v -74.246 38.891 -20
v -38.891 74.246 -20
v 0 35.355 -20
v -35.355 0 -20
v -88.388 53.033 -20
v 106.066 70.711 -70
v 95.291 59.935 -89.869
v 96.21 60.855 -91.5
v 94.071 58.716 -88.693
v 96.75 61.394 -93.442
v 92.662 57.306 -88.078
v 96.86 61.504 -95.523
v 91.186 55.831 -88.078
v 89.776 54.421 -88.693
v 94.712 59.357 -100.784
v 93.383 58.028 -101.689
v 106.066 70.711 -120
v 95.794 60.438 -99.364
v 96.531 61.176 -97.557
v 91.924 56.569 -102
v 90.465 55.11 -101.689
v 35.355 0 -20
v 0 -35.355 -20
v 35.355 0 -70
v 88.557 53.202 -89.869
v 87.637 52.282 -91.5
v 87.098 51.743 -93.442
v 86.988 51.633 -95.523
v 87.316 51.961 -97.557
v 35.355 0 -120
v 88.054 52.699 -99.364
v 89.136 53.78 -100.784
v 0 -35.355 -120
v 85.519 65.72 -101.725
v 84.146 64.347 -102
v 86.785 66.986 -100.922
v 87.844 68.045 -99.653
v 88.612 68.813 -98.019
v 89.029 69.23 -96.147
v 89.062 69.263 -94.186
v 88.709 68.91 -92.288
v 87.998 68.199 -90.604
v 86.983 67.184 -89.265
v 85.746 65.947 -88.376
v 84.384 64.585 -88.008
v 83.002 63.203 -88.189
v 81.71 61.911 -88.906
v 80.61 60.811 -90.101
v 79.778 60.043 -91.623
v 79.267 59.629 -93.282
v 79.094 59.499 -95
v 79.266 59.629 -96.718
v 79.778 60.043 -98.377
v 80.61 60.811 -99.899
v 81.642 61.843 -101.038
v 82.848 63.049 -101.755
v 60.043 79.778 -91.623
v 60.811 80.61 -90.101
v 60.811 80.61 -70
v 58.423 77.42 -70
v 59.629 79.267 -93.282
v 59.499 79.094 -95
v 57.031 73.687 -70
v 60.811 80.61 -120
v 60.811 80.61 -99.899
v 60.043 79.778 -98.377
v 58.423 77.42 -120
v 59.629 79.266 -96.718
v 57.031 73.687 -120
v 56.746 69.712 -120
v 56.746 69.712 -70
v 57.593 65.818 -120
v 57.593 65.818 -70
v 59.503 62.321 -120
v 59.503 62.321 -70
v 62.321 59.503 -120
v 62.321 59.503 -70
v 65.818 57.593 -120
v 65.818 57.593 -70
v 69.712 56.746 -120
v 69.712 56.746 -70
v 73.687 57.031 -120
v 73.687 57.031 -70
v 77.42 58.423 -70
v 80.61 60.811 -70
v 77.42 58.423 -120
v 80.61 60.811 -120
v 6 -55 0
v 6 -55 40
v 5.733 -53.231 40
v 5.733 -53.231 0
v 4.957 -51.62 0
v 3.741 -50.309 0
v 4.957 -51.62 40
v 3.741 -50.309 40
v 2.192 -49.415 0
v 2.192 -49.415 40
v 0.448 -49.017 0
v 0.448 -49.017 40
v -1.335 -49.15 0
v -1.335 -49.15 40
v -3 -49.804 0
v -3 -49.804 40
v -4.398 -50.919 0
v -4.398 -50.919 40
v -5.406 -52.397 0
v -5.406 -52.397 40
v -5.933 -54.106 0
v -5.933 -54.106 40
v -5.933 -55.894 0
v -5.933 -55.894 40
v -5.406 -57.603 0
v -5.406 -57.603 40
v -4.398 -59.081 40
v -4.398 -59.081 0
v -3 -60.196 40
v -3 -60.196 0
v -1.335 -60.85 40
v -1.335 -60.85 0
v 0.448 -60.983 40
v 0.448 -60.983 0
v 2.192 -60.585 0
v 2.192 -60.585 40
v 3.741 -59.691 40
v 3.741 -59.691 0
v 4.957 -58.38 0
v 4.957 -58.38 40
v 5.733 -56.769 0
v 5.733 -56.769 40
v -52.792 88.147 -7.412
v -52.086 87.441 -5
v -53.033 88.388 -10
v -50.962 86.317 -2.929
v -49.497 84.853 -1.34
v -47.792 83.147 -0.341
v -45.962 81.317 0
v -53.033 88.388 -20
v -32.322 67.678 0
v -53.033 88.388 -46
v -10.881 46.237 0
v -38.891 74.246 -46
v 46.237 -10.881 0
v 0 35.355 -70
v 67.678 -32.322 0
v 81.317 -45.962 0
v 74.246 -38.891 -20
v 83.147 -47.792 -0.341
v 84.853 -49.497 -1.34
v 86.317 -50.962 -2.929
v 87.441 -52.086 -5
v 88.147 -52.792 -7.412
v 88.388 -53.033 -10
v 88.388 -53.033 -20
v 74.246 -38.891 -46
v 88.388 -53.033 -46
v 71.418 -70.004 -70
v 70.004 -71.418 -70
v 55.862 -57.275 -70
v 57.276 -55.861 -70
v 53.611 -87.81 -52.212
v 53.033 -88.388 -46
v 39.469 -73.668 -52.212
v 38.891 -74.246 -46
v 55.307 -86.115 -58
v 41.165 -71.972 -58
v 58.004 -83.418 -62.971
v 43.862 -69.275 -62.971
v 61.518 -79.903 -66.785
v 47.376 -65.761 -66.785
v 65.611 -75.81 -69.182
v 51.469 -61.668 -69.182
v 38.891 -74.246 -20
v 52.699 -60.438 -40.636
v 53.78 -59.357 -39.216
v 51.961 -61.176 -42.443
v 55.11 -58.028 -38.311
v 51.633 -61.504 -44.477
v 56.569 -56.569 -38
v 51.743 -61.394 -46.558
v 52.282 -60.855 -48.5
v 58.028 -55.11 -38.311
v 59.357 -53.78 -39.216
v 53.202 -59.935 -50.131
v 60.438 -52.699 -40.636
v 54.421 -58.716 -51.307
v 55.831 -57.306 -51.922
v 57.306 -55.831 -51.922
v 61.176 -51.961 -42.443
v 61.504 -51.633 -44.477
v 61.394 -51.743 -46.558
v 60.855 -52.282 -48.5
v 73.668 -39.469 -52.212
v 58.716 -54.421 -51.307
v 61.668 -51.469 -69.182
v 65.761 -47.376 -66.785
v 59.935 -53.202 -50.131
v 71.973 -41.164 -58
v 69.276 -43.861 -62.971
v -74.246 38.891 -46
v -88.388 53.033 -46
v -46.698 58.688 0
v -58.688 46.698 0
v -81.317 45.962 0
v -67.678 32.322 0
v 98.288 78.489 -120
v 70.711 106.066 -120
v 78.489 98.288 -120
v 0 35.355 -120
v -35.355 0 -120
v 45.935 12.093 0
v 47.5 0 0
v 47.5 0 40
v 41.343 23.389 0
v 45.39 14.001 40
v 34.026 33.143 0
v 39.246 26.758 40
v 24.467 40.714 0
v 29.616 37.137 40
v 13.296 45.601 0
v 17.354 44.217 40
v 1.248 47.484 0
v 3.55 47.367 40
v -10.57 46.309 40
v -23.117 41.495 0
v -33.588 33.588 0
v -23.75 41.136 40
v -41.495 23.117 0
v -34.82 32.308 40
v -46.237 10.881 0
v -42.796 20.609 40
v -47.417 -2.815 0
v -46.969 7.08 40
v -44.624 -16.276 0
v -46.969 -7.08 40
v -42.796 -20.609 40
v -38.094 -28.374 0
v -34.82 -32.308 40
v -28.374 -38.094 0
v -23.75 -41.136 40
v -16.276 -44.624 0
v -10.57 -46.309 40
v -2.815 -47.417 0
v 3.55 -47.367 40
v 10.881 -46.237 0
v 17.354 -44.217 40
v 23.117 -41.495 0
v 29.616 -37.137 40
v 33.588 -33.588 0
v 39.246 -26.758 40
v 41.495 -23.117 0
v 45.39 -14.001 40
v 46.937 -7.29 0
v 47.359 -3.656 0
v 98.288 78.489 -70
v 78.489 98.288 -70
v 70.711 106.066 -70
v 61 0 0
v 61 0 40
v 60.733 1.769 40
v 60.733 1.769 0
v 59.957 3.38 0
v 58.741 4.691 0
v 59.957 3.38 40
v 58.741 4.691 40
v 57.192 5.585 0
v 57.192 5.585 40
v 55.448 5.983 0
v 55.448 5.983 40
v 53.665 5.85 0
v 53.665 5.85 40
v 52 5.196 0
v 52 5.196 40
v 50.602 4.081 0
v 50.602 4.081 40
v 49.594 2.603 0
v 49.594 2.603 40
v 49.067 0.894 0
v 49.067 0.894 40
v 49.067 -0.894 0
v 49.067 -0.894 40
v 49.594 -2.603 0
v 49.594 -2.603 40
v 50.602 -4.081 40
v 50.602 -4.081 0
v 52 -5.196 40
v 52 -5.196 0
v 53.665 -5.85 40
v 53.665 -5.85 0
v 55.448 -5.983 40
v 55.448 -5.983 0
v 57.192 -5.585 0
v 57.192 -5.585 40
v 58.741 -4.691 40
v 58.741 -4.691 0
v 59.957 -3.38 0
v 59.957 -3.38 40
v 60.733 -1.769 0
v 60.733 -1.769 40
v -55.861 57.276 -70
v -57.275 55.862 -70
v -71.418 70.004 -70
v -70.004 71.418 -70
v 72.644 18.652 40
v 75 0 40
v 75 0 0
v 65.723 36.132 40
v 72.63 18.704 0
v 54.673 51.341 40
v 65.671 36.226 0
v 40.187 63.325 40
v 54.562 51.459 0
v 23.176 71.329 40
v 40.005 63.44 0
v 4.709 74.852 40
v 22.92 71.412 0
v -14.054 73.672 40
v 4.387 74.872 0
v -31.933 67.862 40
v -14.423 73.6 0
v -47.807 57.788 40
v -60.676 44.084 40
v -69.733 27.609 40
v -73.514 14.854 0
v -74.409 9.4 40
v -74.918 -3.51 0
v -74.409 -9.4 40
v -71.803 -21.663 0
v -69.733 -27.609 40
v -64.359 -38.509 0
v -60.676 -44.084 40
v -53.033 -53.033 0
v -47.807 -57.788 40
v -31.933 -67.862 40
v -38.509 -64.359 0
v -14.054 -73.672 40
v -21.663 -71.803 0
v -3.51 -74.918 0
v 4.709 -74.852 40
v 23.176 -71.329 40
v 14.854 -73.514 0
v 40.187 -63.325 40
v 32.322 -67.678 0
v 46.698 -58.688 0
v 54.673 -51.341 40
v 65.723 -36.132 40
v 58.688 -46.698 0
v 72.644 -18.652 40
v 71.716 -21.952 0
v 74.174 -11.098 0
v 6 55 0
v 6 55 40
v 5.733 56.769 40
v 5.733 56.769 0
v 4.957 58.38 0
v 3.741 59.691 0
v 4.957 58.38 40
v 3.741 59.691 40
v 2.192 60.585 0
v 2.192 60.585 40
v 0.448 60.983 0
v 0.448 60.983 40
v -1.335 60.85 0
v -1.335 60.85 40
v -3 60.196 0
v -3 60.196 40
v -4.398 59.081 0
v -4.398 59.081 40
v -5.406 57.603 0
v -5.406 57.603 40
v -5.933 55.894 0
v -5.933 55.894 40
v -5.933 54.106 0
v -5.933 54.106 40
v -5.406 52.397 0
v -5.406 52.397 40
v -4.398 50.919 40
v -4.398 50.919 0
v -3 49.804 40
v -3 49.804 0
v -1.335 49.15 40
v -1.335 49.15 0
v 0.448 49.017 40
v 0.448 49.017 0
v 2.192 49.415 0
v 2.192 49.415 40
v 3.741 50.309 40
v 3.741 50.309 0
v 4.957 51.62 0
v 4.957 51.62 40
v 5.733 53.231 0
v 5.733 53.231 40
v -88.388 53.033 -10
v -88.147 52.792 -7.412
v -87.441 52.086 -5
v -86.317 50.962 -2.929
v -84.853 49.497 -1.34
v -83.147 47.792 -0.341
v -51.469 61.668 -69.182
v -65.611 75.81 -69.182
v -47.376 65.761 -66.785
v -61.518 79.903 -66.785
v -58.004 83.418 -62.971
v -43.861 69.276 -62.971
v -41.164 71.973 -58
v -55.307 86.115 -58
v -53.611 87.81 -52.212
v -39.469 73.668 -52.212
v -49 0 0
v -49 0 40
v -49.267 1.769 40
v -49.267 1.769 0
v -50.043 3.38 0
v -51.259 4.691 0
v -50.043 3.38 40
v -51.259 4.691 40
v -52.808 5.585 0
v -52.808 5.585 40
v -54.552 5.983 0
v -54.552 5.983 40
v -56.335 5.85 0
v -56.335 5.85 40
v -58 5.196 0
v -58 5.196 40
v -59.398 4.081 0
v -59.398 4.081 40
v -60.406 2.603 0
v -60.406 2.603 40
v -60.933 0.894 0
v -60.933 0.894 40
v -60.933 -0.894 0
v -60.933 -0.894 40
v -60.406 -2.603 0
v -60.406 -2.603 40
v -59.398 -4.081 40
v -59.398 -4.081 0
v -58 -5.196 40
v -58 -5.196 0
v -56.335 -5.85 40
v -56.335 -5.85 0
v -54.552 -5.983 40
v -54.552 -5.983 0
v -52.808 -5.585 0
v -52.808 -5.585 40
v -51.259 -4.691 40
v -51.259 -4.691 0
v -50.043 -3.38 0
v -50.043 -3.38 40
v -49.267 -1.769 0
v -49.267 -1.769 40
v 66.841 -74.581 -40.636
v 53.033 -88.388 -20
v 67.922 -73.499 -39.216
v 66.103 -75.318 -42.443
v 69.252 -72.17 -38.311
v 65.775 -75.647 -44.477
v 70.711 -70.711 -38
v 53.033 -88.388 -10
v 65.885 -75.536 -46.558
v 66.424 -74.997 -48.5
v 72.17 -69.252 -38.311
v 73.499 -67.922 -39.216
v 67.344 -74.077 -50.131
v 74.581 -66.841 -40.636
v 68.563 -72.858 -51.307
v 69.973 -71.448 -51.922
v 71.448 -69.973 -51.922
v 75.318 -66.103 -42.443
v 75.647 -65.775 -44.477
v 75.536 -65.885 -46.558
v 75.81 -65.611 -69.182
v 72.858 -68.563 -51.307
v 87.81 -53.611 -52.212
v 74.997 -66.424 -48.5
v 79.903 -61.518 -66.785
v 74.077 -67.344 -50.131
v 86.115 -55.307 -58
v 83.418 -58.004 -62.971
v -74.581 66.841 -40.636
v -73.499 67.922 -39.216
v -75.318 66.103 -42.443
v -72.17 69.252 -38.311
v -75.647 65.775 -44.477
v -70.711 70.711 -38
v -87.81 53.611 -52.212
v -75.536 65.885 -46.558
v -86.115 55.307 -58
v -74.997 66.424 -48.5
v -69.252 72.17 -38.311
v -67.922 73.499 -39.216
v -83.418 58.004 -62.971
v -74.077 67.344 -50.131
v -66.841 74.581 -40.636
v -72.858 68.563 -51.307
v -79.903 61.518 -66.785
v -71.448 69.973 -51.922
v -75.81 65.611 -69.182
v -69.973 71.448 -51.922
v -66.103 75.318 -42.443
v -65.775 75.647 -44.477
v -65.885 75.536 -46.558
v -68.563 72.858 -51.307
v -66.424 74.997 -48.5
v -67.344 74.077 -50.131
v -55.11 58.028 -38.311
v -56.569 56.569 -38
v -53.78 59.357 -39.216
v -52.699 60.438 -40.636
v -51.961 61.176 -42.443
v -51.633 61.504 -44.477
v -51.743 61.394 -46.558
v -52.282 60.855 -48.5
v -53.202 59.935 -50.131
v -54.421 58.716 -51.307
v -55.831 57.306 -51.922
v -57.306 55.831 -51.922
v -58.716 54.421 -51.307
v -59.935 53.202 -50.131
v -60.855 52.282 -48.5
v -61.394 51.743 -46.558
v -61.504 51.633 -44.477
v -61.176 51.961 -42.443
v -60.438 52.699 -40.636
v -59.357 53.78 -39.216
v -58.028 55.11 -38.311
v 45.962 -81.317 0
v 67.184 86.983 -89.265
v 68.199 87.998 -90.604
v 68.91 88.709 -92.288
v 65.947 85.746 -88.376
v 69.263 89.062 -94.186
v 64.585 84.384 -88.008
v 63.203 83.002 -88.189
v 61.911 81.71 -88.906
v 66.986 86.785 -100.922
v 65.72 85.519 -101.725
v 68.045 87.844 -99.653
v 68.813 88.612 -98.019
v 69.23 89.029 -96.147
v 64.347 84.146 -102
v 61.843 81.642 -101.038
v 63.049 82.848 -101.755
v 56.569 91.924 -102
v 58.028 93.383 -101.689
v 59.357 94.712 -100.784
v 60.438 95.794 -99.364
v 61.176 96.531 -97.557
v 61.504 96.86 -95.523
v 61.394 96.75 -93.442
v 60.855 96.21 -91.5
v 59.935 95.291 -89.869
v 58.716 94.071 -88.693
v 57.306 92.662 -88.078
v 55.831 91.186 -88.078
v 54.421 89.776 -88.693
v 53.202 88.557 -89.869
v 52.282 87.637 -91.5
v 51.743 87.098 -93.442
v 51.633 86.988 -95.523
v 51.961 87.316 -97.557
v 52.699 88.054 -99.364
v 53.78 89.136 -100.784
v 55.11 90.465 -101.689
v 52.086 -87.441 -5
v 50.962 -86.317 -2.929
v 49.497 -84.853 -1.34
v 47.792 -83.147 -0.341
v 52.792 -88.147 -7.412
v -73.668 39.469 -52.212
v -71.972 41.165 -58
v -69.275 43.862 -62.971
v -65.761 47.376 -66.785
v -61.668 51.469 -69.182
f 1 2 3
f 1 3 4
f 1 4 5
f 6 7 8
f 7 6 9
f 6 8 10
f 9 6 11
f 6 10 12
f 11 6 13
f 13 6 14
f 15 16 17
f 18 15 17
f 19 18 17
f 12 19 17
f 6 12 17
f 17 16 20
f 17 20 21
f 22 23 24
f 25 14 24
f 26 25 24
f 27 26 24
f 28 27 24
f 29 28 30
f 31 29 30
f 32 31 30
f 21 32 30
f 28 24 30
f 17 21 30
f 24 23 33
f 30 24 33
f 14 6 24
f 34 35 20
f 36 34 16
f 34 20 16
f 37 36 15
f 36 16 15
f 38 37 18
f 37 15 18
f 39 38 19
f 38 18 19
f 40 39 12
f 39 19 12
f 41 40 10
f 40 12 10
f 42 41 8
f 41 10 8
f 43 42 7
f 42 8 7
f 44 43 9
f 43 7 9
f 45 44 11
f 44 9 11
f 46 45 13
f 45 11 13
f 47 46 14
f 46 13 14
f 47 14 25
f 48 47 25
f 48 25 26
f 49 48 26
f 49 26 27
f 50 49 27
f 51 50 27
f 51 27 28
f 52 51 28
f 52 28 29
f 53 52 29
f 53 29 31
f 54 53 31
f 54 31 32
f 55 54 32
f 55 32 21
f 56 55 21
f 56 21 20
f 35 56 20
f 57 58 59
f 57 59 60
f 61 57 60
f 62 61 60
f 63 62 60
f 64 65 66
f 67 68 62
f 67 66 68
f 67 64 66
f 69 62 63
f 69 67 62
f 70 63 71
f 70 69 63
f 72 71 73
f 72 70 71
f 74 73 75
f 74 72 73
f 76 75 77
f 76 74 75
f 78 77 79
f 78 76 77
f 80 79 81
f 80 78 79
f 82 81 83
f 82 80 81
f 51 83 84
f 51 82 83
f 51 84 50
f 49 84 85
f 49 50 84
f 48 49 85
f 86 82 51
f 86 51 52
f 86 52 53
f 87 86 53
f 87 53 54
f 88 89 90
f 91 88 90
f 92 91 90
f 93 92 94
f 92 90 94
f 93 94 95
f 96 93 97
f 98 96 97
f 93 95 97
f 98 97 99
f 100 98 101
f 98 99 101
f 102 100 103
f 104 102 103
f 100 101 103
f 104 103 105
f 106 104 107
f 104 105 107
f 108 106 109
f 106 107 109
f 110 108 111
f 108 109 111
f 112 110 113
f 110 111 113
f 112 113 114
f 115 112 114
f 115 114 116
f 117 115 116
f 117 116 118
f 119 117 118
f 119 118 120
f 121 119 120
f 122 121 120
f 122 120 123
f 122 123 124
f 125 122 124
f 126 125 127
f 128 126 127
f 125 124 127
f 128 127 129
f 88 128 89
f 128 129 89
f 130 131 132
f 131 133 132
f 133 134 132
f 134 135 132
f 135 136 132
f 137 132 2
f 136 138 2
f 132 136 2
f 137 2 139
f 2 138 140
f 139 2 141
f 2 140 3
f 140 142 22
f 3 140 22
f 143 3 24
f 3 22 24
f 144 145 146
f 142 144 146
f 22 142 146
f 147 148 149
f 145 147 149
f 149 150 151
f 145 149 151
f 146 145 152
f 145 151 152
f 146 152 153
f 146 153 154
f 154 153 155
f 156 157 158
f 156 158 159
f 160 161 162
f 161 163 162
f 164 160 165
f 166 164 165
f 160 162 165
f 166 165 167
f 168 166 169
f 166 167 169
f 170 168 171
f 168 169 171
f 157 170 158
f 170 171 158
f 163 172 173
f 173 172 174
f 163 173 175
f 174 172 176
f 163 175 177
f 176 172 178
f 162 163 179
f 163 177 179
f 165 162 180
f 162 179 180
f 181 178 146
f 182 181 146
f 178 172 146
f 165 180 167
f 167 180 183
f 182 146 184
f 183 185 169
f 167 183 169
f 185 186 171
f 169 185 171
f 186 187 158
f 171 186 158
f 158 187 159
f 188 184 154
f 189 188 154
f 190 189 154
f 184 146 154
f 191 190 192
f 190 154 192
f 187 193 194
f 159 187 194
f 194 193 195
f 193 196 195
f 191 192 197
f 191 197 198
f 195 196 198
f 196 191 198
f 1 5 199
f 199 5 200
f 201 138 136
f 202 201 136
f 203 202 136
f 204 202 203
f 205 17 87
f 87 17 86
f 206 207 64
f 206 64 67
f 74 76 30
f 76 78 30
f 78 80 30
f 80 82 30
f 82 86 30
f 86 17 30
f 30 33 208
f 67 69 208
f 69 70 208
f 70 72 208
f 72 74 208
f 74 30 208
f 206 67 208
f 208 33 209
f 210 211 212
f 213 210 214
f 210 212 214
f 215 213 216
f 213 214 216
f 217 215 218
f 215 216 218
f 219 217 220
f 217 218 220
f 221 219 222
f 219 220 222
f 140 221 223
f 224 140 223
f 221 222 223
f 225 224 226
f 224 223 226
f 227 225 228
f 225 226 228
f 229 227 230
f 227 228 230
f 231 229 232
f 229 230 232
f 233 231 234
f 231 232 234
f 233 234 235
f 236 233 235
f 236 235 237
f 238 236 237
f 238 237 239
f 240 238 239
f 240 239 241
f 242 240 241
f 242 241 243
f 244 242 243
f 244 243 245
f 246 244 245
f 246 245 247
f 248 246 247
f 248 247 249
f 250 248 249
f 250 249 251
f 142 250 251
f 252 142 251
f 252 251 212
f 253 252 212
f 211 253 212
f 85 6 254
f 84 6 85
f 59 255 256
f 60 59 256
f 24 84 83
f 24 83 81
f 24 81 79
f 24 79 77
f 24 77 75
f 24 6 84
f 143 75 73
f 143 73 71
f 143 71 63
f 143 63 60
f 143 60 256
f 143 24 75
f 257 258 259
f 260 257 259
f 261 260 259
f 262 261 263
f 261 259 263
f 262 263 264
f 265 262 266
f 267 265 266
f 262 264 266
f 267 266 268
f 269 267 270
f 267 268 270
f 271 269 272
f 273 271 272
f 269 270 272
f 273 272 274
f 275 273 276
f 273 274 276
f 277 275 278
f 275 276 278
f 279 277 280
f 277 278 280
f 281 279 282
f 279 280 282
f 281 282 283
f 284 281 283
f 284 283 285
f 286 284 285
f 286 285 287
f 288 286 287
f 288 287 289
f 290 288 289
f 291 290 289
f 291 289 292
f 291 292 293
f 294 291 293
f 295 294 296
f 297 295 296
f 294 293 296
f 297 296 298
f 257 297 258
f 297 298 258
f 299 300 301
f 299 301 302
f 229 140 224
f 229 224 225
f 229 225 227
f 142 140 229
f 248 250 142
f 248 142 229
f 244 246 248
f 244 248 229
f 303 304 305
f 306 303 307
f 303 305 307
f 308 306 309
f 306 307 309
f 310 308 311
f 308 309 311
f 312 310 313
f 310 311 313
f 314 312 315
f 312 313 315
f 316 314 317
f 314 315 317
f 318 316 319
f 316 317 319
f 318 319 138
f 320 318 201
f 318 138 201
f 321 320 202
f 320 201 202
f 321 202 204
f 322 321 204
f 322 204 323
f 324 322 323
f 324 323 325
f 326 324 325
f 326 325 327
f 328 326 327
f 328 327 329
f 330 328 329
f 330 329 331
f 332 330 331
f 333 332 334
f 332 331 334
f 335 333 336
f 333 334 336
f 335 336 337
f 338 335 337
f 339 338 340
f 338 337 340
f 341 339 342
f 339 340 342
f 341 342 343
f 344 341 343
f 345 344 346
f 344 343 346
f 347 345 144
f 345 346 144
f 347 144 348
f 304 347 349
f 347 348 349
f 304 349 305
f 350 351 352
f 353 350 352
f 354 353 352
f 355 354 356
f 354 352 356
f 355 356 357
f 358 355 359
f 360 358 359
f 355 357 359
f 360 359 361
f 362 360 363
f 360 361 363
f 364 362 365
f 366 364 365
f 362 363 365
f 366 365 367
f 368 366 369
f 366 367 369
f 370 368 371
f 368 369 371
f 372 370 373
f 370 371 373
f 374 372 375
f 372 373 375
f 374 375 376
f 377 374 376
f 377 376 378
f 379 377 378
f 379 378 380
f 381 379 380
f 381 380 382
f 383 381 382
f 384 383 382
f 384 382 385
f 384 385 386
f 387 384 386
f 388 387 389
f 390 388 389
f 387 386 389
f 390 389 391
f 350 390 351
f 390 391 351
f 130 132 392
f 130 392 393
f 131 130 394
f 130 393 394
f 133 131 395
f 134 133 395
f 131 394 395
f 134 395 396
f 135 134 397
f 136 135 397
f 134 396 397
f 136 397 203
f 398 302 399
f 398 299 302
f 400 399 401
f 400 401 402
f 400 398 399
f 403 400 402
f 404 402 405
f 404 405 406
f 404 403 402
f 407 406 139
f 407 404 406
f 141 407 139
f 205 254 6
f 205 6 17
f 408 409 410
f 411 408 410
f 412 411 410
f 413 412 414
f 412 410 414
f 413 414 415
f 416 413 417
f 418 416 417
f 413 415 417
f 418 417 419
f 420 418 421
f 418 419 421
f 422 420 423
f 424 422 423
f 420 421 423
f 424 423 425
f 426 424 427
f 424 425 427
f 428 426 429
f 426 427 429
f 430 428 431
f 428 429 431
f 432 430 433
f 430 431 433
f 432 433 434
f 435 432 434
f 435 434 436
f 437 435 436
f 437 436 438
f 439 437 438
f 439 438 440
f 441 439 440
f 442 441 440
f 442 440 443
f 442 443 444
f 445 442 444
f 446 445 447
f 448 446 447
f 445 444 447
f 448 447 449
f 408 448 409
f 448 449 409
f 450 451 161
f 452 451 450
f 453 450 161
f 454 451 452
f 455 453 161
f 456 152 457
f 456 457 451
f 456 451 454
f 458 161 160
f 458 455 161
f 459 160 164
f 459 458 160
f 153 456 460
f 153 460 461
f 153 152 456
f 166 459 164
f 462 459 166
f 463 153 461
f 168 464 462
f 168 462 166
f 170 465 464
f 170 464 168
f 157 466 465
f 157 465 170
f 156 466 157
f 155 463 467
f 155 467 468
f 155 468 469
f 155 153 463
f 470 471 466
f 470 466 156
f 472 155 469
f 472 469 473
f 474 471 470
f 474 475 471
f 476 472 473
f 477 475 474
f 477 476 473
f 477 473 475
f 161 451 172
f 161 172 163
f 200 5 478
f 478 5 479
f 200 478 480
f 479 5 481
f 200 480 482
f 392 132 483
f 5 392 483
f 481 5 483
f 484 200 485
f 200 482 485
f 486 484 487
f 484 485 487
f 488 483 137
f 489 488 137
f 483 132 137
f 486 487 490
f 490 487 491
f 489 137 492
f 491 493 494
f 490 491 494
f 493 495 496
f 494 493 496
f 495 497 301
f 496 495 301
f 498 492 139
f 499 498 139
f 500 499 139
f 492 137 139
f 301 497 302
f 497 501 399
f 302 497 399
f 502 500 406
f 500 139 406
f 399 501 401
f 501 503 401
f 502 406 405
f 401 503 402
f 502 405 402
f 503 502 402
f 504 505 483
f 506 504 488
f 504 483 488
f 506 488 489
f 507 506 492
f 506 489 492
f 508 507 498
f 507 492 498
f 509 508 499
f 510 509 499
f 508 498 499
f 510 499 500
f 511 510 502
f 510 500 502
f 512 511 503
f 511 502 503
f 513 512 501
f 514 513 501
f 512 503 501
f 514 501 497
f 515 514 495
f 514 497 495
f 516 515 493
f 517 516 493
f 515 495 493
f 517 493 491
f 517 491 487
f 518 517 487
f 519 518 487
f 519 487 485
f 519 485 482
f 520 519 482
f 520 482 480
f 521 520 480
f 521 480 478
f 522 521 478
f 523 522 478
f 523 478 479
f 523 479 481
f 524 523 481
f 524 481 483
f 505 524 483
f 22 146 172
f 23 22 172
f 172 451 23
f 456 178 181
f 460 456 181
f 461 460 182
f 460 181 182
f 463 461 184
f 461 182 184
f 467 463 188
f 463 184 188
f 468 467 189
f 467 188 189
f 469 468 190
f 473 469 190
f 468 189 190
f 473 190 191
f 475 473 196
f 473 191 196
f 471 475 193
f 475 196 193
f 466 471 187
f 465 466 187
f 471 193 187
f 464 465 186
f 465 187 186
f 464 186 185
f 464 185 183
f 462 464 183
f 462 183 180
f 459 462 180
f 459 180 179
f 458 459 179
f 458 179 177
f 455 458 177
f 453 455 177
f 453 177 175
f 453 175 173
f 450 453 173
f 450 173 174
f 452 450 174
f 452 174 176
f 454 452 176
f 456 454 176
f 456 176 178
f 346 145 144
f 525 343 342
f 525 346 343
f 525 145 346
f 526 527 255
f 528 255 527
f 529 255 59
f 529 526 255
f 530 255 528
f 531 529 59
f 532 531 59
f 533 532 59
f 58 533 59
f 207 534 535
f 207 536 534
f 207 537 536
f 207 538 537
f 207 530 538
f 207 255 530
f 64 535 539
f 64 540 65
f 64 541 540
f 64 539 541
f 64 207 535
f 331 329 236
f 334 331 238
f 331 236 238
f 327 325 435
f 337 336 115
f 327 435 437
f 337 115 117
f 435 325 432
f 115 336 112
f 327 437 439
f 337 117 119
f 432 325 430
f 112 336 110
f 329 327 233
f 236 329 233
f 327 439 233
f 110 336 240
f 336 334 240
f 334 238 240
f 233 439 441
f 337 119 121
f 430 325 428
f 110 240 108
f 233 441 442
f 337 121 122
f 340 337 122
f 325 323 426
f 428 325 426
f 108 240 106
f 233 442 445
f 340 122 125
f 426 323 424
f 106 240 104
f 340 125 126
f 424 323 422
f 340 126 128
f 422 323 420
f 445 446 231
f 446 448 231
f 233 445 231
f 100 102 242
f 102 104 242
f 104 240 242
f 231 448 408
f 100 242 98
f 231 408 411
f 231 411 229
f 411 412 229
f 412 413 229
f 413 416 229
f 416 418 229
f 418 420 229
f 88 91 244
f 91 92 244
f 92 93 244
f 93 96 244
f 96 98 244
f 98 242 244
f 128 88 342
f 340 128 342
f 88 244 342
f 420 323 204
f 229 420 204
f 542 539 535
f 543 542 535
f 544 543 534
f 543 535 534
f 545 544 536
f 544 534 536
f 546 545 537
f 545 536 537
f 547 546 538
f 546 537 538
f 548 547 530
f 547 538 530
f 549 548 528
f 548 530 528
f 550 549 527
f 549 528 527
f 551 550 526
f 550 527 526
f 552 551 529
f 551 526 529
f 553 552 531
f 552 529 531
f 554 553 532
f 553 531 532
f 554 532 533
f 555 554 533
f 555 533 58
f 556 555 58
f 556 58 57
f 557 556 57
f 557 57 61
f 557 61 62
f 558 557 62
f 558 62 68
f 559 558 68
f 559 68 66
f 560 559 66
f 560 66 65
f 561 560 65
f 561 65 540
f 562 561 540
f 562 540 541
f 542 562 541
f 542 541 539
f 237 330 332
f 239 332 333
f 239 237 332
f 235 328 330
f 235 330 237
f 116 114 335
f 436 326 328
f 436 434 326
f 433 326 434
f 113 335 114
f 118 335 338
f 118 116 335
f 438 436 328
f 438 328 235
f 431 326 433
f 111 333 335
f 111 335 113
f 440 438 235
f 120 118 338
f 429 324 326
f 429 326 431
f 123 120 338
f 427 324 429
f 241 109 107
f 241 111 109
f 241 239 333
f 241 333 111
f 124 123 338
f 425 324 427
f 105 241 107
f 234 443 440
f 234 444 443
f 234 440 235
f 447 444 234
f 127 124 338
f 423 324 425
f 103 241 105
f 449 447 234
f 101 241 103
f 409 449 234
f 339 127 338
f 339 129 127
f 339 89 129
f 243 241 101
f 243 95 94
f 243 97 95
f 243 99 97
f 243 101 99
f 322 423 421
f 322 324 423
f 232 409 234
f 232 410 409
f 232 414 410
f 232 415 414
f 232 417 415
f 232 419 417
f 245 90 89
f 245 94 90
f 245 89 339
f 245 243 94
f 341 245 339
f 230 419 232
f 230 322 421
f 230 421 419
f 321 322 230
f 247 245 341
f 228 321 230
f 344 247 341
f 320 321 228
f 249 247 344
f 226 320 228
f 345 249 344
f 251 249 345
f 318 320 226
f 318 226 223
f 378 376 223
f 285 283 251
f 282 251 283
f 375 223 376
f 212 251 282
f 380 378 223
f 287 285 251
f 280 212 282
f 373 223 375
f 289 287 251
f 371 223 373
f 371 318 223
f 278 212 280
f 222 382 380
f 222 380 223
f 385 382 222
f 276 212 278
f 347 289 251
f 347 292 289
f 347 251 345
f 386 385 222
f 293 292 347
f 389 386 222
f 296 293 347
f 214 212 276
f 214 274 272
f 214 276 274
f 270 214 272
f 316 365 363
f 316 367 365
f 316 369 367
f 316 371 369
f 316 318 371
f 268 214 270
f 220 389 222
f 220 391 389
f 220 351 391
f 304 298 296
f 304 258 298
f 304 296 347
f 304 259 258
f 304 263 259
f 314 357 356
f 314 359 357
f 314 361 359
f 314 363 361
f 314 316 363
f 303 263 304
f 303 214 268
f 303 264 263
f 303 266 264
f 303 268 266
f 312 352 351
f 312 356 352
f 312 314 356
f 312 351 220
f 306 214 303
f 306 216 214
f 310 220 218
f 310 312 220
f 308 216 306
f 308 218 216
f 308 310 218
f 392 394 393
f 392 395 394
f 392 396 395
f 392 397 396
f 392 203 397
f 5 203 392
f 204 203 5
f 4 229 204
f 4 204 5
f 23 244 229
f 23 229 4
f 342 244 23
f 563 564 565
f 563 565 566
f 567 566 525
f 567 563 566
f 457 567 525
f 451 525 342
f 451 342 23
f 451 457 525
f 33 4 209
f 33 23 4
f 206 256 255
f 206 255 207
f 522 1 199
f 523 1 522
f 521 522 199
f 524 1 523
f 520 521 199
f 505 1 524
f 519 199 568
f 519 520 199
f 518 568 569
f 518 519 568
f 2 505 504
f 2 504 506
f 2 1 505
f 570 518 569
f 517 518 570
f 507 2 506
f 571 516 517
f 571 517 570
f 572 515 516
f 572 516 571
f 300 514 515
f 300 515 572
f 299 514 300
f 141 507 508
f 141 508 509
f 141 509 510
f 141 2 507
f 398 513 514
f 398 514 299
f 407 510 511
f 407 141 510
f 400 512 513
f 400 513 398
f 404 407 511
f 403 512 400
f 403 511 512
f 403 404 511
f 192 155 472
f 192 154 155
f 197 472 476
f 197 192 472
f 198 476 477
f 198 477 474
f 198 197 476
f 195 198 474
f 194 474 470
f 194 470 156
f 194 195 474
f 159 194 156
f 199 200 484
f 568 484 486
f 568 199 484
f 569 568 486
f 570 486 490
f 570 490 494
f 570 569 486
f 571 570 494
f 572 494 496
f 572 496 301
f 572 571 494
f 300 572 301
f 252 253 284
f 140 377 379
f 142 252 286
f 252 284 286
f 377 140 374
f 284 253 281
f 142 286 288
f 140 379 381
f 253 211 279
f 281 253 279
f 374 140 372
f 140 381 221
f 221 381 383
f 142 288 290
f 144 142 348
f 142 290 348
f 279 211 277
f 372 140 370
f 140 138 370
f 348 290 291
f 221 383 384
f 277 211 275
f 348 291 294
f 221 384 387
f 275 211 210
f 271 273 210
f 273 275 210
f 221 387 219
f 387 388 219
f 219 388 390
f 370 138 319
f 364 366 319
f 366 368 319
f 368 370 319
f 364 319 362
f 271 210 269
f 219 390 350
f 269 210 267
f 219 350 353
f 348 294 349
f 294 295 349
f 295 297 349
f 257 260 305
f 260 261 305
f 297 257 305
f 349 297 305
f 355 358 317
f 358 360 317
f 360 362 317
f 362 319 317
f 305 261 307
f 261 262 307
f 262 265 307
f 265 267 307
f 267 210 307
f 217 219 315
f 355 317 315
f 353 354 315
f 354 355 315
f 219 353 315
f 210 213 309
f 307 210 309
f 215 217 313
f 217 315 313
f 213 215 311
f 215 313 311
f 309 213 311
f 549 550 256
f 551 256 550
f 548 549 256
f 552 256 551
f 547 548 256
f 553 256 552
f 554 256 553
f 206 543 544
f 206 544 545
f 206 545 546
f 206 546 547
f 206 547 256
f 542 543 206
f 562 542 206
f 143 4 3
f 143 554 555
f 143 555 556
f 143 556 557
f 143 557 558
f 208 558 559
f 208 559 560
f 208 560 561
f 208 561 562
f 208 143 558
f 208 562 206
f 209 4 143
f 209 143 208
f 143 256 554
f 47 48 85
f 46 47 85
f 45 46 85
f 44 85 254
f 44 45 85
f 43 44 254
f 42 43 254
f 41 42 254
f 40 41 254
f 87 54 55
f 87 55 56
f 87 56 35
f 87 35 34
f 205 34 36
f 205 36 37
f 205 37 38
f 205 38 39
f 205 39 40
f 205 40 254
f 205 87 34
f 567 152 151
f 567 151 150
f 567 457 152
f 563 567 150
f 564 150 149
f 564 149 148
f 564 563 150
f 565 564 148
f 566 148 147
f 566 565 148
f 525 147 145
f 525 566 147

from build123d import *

# Parameters (mm, degrees)
SZKIC1_R                    = 75
DODANIE_WYCI_GNI_CIE1_DEPTH = 40
SZKIC2_R                    = 6
WYTNIJ_WYCI_GNI_CIE1_DEPTH  = 40
SZKIC3_R                    = 47.5
WYTNIJ_WYCI_GNI_CIE2_DEPTH  = 40
SZKIC4_W                    = 50
SZKIC4_H                    = 20
DODANIE_WYCI_GNI_CIE2_DEPTH = 100
SZKIC6_W                    = 50
SZKIC6_H                    = 49.999779654
DODANIE_WYCI_GNI_CIE3_DEPTH = 20
SZKIC7_R                    = 7
WYTNIJ_WYCI_GNI_CIE3_DEPTH  = 226
ZAOKR_GLENIE1_R             = 24
ZAOKR_GLENIE2_R             = 10
DODANIE_WYCI_GNI_CIE4_DEPTH = 100
SZKIC10_W                   = 50
SZKIC10_H                   = 50
DODANIE_WYCI_GNI_CIE5_DEPTH = 100
SZKIC12_R                   = 7
WYTNIJ_WYCI_GNI_CIE5_DEPTH  = 163.5
WYTNIJ_WYCI_GNI_CIE6_DEPTH  = 161


with BuildPart() as part:
    # Szkic1 → Dodanie-wyciągnięcie1 (new body)
    with BuildSketch(Plane.XY):
        Circle(SZKIC1_R)
    extrude(amount=DODANIE_WYCI_GNI_CIE1_DEPTH)

    # Szkic2 → Wytnij-wyciągnięcie1 (cut)
    with BuildSketch(Plane.XY.offset(40)):
        with Locations((-55, 0)):
            Circle(SZKIC2_R)
        with Locations((0, 55)):
            Circle(SZKIC2_R)
        with Locations((55, 0)):
            Circle(SZKIC2_R)
        with Locations((0, -55)):
            Circle(SZKIC2_R)
    extrude(amount=-WYTNIJ_WYCI_GNI_CIE1_DEPTH, mode=Mode.SUBTRACT)

    # Szkic3 → Wytnij-wyciągnięcie2 (cut)
    with BuildSketch(Plane.XY.offset(40)):
        Circle(SZKIC3_R)
    extrude(amount=-WYTNIJ_WYCI_GNI_CIE2_DEPTH, mode=Mode.SUBTRACT)

    # Szkic4 → Dodanie-wyciągnięcie2 (add, symmetric)
    with BuildSketch(Plane(origin=(0, 0, 0), x_dir=(-0.707106781, -0.707106781, 0), z_dir=(0.707106781, -0.707106781, 0))):
        with Locations((0, 10)):
            Rectangle(SZKIC4_W, SZKIC4_H)
    extrude(amount=DODANIE_WYCI_GNI_CIE2_DEPTH, both=True)

    # Szkic6 → Dodanie-wyciągnięcie3 (add)
    with BuildSketch(Plane(origin=(70.710678119, -70.710678119, 0), x_dir=(0, 0, -1), z_dir=(0.707106781, -0.707106781, 0))):
        with Locations((45, 0.000110173)):
            Rectangle(SZKIC6_W, SZKIC6_H)
    dodanie_wyci_gni_cie3 = extrude(amount=-DODANIE_WYCI_GNI_CIE3_DEPTH)

    # Lustro1: Dodanie-wyciągnięcie3 across plane
    add(dodanie_wyci_gni_cie3.mirror(Plane(origin=(0, 0, 0), x_dir=(0, 0, 1), z_dir=(0.707106781, -0.707106781, 0))))

    # Szkic7 → Wytnij-wyciągnięcie3 (cut, through all)
    with BuildSketch(Plane(origin=(-70.710678119, 70.710678119, 0), x_dir=(0, 0, 1), z_dir=(-0.707106781, 0.707106781, 0))):
        with Locations((-45, 0)):
            Circle(SZKIC7_R)
    extrude(amount=-WYTNIJ_WYCI_GNI_CIE3_DEPTH, mode=Mode.SUBTRACT)

    # Zaokrąglenie1
    zaokr_glenie1_edges = [part.edges().sort_by_distance(p)[0] for p in [
        (81.317279836, -45.961940777, -70),
        (45.962096585, -81.317124028, -70),
        (-81.317124028, 45.962096585, -70),
        (-45.961940777, 81.317279836, -70),
    ]]
    fillet(zaokr_glenie1_edges, radius=ZAOKR_GLENIE1_R)

    # Zaokrąglenie2
    zaokr_glenie2_edges = [part.edges().sort_by_distance(p)[0] for p in [
        (-70.710678119, 70.710678119, 0),
        (70.710678119, -70.710678119, 0),
    ]]
    fillet(zaokr_glenie2_edges, radius=ZAOKR_GLENIE2_R)

    # Szkic8 → Dodanie-wyciągnięcie4 (add)
    with BuildSketch(Plane(origin=(0, 0, -20), x_dir=(-1, 0, 0), z_dir=(0, 0, -1))):
        Polygon((0, 35.355339059), (35.355339059, 0), (0, -35.355339059), (-35.355339059, 0), align=None)
    extrude(amount=DODANIE_WYCI_GNI_CIE4_DEPTH)

    # Szkic10 → Dodanie-wyciągnięcie5 (add)
    with BuildSketch(Plane(origin=(17.67766953, 17.67766953, 0), x_dir=(0, 0, -1), z_dir=(0.707106781, 0.707106781, 0))):
        with Locations((95, 0)):
            Rectangle(SZKIC10_W, SZKIC10_H)
    extrude(amount=DODANIE_WYCI_GNI_CIE5_DEPTH)

    # Szkic12 → Wytnij-wyciągnięcie5 (cut, through all)
    with BuildSketch(Plane(origin=(17.67766953, -17.67766953, 0), x_dir=(0, 0, -1), z_dir=(0.707106781, -0.707106781, 0))):
        with Locations((95, 105)):
            Circle(SZKIC12_R)
    extrude(amount=-WYTNIJ_WYCI_GNI_CIE5_DEPTH, mode=Mode.SUBTRACT)

    # Szkic14 → Wytnij-wyciągnięcie6 (cut, through all)
    with BuildSketch(Plane(origin=(0, 0, -120), x_dir=(-1, 0, 0), z_dir=(0, 0, -1))):
        with BuildLine():
            Line((-80.610173055, 60.811183182), (-98.287842585, 78.488852712))
            Line((-98.287842585, 78.488852712), (-78.488852712, 98.287842585))
            Line((-78.488852712, 98.287842585), (-60.811183182, 80.610173055))
            ThreePointArc((-60.811183182, 80.610173055), (-60.811183182, 60.811183182), (-80.610173055, 60.811183182))
        make_face()
    extrude(amount=-WYTNIJ_WYCI_GNI_CIE6_DEPTH, mode=Mode.SUBTRACT)


solid = part.part
